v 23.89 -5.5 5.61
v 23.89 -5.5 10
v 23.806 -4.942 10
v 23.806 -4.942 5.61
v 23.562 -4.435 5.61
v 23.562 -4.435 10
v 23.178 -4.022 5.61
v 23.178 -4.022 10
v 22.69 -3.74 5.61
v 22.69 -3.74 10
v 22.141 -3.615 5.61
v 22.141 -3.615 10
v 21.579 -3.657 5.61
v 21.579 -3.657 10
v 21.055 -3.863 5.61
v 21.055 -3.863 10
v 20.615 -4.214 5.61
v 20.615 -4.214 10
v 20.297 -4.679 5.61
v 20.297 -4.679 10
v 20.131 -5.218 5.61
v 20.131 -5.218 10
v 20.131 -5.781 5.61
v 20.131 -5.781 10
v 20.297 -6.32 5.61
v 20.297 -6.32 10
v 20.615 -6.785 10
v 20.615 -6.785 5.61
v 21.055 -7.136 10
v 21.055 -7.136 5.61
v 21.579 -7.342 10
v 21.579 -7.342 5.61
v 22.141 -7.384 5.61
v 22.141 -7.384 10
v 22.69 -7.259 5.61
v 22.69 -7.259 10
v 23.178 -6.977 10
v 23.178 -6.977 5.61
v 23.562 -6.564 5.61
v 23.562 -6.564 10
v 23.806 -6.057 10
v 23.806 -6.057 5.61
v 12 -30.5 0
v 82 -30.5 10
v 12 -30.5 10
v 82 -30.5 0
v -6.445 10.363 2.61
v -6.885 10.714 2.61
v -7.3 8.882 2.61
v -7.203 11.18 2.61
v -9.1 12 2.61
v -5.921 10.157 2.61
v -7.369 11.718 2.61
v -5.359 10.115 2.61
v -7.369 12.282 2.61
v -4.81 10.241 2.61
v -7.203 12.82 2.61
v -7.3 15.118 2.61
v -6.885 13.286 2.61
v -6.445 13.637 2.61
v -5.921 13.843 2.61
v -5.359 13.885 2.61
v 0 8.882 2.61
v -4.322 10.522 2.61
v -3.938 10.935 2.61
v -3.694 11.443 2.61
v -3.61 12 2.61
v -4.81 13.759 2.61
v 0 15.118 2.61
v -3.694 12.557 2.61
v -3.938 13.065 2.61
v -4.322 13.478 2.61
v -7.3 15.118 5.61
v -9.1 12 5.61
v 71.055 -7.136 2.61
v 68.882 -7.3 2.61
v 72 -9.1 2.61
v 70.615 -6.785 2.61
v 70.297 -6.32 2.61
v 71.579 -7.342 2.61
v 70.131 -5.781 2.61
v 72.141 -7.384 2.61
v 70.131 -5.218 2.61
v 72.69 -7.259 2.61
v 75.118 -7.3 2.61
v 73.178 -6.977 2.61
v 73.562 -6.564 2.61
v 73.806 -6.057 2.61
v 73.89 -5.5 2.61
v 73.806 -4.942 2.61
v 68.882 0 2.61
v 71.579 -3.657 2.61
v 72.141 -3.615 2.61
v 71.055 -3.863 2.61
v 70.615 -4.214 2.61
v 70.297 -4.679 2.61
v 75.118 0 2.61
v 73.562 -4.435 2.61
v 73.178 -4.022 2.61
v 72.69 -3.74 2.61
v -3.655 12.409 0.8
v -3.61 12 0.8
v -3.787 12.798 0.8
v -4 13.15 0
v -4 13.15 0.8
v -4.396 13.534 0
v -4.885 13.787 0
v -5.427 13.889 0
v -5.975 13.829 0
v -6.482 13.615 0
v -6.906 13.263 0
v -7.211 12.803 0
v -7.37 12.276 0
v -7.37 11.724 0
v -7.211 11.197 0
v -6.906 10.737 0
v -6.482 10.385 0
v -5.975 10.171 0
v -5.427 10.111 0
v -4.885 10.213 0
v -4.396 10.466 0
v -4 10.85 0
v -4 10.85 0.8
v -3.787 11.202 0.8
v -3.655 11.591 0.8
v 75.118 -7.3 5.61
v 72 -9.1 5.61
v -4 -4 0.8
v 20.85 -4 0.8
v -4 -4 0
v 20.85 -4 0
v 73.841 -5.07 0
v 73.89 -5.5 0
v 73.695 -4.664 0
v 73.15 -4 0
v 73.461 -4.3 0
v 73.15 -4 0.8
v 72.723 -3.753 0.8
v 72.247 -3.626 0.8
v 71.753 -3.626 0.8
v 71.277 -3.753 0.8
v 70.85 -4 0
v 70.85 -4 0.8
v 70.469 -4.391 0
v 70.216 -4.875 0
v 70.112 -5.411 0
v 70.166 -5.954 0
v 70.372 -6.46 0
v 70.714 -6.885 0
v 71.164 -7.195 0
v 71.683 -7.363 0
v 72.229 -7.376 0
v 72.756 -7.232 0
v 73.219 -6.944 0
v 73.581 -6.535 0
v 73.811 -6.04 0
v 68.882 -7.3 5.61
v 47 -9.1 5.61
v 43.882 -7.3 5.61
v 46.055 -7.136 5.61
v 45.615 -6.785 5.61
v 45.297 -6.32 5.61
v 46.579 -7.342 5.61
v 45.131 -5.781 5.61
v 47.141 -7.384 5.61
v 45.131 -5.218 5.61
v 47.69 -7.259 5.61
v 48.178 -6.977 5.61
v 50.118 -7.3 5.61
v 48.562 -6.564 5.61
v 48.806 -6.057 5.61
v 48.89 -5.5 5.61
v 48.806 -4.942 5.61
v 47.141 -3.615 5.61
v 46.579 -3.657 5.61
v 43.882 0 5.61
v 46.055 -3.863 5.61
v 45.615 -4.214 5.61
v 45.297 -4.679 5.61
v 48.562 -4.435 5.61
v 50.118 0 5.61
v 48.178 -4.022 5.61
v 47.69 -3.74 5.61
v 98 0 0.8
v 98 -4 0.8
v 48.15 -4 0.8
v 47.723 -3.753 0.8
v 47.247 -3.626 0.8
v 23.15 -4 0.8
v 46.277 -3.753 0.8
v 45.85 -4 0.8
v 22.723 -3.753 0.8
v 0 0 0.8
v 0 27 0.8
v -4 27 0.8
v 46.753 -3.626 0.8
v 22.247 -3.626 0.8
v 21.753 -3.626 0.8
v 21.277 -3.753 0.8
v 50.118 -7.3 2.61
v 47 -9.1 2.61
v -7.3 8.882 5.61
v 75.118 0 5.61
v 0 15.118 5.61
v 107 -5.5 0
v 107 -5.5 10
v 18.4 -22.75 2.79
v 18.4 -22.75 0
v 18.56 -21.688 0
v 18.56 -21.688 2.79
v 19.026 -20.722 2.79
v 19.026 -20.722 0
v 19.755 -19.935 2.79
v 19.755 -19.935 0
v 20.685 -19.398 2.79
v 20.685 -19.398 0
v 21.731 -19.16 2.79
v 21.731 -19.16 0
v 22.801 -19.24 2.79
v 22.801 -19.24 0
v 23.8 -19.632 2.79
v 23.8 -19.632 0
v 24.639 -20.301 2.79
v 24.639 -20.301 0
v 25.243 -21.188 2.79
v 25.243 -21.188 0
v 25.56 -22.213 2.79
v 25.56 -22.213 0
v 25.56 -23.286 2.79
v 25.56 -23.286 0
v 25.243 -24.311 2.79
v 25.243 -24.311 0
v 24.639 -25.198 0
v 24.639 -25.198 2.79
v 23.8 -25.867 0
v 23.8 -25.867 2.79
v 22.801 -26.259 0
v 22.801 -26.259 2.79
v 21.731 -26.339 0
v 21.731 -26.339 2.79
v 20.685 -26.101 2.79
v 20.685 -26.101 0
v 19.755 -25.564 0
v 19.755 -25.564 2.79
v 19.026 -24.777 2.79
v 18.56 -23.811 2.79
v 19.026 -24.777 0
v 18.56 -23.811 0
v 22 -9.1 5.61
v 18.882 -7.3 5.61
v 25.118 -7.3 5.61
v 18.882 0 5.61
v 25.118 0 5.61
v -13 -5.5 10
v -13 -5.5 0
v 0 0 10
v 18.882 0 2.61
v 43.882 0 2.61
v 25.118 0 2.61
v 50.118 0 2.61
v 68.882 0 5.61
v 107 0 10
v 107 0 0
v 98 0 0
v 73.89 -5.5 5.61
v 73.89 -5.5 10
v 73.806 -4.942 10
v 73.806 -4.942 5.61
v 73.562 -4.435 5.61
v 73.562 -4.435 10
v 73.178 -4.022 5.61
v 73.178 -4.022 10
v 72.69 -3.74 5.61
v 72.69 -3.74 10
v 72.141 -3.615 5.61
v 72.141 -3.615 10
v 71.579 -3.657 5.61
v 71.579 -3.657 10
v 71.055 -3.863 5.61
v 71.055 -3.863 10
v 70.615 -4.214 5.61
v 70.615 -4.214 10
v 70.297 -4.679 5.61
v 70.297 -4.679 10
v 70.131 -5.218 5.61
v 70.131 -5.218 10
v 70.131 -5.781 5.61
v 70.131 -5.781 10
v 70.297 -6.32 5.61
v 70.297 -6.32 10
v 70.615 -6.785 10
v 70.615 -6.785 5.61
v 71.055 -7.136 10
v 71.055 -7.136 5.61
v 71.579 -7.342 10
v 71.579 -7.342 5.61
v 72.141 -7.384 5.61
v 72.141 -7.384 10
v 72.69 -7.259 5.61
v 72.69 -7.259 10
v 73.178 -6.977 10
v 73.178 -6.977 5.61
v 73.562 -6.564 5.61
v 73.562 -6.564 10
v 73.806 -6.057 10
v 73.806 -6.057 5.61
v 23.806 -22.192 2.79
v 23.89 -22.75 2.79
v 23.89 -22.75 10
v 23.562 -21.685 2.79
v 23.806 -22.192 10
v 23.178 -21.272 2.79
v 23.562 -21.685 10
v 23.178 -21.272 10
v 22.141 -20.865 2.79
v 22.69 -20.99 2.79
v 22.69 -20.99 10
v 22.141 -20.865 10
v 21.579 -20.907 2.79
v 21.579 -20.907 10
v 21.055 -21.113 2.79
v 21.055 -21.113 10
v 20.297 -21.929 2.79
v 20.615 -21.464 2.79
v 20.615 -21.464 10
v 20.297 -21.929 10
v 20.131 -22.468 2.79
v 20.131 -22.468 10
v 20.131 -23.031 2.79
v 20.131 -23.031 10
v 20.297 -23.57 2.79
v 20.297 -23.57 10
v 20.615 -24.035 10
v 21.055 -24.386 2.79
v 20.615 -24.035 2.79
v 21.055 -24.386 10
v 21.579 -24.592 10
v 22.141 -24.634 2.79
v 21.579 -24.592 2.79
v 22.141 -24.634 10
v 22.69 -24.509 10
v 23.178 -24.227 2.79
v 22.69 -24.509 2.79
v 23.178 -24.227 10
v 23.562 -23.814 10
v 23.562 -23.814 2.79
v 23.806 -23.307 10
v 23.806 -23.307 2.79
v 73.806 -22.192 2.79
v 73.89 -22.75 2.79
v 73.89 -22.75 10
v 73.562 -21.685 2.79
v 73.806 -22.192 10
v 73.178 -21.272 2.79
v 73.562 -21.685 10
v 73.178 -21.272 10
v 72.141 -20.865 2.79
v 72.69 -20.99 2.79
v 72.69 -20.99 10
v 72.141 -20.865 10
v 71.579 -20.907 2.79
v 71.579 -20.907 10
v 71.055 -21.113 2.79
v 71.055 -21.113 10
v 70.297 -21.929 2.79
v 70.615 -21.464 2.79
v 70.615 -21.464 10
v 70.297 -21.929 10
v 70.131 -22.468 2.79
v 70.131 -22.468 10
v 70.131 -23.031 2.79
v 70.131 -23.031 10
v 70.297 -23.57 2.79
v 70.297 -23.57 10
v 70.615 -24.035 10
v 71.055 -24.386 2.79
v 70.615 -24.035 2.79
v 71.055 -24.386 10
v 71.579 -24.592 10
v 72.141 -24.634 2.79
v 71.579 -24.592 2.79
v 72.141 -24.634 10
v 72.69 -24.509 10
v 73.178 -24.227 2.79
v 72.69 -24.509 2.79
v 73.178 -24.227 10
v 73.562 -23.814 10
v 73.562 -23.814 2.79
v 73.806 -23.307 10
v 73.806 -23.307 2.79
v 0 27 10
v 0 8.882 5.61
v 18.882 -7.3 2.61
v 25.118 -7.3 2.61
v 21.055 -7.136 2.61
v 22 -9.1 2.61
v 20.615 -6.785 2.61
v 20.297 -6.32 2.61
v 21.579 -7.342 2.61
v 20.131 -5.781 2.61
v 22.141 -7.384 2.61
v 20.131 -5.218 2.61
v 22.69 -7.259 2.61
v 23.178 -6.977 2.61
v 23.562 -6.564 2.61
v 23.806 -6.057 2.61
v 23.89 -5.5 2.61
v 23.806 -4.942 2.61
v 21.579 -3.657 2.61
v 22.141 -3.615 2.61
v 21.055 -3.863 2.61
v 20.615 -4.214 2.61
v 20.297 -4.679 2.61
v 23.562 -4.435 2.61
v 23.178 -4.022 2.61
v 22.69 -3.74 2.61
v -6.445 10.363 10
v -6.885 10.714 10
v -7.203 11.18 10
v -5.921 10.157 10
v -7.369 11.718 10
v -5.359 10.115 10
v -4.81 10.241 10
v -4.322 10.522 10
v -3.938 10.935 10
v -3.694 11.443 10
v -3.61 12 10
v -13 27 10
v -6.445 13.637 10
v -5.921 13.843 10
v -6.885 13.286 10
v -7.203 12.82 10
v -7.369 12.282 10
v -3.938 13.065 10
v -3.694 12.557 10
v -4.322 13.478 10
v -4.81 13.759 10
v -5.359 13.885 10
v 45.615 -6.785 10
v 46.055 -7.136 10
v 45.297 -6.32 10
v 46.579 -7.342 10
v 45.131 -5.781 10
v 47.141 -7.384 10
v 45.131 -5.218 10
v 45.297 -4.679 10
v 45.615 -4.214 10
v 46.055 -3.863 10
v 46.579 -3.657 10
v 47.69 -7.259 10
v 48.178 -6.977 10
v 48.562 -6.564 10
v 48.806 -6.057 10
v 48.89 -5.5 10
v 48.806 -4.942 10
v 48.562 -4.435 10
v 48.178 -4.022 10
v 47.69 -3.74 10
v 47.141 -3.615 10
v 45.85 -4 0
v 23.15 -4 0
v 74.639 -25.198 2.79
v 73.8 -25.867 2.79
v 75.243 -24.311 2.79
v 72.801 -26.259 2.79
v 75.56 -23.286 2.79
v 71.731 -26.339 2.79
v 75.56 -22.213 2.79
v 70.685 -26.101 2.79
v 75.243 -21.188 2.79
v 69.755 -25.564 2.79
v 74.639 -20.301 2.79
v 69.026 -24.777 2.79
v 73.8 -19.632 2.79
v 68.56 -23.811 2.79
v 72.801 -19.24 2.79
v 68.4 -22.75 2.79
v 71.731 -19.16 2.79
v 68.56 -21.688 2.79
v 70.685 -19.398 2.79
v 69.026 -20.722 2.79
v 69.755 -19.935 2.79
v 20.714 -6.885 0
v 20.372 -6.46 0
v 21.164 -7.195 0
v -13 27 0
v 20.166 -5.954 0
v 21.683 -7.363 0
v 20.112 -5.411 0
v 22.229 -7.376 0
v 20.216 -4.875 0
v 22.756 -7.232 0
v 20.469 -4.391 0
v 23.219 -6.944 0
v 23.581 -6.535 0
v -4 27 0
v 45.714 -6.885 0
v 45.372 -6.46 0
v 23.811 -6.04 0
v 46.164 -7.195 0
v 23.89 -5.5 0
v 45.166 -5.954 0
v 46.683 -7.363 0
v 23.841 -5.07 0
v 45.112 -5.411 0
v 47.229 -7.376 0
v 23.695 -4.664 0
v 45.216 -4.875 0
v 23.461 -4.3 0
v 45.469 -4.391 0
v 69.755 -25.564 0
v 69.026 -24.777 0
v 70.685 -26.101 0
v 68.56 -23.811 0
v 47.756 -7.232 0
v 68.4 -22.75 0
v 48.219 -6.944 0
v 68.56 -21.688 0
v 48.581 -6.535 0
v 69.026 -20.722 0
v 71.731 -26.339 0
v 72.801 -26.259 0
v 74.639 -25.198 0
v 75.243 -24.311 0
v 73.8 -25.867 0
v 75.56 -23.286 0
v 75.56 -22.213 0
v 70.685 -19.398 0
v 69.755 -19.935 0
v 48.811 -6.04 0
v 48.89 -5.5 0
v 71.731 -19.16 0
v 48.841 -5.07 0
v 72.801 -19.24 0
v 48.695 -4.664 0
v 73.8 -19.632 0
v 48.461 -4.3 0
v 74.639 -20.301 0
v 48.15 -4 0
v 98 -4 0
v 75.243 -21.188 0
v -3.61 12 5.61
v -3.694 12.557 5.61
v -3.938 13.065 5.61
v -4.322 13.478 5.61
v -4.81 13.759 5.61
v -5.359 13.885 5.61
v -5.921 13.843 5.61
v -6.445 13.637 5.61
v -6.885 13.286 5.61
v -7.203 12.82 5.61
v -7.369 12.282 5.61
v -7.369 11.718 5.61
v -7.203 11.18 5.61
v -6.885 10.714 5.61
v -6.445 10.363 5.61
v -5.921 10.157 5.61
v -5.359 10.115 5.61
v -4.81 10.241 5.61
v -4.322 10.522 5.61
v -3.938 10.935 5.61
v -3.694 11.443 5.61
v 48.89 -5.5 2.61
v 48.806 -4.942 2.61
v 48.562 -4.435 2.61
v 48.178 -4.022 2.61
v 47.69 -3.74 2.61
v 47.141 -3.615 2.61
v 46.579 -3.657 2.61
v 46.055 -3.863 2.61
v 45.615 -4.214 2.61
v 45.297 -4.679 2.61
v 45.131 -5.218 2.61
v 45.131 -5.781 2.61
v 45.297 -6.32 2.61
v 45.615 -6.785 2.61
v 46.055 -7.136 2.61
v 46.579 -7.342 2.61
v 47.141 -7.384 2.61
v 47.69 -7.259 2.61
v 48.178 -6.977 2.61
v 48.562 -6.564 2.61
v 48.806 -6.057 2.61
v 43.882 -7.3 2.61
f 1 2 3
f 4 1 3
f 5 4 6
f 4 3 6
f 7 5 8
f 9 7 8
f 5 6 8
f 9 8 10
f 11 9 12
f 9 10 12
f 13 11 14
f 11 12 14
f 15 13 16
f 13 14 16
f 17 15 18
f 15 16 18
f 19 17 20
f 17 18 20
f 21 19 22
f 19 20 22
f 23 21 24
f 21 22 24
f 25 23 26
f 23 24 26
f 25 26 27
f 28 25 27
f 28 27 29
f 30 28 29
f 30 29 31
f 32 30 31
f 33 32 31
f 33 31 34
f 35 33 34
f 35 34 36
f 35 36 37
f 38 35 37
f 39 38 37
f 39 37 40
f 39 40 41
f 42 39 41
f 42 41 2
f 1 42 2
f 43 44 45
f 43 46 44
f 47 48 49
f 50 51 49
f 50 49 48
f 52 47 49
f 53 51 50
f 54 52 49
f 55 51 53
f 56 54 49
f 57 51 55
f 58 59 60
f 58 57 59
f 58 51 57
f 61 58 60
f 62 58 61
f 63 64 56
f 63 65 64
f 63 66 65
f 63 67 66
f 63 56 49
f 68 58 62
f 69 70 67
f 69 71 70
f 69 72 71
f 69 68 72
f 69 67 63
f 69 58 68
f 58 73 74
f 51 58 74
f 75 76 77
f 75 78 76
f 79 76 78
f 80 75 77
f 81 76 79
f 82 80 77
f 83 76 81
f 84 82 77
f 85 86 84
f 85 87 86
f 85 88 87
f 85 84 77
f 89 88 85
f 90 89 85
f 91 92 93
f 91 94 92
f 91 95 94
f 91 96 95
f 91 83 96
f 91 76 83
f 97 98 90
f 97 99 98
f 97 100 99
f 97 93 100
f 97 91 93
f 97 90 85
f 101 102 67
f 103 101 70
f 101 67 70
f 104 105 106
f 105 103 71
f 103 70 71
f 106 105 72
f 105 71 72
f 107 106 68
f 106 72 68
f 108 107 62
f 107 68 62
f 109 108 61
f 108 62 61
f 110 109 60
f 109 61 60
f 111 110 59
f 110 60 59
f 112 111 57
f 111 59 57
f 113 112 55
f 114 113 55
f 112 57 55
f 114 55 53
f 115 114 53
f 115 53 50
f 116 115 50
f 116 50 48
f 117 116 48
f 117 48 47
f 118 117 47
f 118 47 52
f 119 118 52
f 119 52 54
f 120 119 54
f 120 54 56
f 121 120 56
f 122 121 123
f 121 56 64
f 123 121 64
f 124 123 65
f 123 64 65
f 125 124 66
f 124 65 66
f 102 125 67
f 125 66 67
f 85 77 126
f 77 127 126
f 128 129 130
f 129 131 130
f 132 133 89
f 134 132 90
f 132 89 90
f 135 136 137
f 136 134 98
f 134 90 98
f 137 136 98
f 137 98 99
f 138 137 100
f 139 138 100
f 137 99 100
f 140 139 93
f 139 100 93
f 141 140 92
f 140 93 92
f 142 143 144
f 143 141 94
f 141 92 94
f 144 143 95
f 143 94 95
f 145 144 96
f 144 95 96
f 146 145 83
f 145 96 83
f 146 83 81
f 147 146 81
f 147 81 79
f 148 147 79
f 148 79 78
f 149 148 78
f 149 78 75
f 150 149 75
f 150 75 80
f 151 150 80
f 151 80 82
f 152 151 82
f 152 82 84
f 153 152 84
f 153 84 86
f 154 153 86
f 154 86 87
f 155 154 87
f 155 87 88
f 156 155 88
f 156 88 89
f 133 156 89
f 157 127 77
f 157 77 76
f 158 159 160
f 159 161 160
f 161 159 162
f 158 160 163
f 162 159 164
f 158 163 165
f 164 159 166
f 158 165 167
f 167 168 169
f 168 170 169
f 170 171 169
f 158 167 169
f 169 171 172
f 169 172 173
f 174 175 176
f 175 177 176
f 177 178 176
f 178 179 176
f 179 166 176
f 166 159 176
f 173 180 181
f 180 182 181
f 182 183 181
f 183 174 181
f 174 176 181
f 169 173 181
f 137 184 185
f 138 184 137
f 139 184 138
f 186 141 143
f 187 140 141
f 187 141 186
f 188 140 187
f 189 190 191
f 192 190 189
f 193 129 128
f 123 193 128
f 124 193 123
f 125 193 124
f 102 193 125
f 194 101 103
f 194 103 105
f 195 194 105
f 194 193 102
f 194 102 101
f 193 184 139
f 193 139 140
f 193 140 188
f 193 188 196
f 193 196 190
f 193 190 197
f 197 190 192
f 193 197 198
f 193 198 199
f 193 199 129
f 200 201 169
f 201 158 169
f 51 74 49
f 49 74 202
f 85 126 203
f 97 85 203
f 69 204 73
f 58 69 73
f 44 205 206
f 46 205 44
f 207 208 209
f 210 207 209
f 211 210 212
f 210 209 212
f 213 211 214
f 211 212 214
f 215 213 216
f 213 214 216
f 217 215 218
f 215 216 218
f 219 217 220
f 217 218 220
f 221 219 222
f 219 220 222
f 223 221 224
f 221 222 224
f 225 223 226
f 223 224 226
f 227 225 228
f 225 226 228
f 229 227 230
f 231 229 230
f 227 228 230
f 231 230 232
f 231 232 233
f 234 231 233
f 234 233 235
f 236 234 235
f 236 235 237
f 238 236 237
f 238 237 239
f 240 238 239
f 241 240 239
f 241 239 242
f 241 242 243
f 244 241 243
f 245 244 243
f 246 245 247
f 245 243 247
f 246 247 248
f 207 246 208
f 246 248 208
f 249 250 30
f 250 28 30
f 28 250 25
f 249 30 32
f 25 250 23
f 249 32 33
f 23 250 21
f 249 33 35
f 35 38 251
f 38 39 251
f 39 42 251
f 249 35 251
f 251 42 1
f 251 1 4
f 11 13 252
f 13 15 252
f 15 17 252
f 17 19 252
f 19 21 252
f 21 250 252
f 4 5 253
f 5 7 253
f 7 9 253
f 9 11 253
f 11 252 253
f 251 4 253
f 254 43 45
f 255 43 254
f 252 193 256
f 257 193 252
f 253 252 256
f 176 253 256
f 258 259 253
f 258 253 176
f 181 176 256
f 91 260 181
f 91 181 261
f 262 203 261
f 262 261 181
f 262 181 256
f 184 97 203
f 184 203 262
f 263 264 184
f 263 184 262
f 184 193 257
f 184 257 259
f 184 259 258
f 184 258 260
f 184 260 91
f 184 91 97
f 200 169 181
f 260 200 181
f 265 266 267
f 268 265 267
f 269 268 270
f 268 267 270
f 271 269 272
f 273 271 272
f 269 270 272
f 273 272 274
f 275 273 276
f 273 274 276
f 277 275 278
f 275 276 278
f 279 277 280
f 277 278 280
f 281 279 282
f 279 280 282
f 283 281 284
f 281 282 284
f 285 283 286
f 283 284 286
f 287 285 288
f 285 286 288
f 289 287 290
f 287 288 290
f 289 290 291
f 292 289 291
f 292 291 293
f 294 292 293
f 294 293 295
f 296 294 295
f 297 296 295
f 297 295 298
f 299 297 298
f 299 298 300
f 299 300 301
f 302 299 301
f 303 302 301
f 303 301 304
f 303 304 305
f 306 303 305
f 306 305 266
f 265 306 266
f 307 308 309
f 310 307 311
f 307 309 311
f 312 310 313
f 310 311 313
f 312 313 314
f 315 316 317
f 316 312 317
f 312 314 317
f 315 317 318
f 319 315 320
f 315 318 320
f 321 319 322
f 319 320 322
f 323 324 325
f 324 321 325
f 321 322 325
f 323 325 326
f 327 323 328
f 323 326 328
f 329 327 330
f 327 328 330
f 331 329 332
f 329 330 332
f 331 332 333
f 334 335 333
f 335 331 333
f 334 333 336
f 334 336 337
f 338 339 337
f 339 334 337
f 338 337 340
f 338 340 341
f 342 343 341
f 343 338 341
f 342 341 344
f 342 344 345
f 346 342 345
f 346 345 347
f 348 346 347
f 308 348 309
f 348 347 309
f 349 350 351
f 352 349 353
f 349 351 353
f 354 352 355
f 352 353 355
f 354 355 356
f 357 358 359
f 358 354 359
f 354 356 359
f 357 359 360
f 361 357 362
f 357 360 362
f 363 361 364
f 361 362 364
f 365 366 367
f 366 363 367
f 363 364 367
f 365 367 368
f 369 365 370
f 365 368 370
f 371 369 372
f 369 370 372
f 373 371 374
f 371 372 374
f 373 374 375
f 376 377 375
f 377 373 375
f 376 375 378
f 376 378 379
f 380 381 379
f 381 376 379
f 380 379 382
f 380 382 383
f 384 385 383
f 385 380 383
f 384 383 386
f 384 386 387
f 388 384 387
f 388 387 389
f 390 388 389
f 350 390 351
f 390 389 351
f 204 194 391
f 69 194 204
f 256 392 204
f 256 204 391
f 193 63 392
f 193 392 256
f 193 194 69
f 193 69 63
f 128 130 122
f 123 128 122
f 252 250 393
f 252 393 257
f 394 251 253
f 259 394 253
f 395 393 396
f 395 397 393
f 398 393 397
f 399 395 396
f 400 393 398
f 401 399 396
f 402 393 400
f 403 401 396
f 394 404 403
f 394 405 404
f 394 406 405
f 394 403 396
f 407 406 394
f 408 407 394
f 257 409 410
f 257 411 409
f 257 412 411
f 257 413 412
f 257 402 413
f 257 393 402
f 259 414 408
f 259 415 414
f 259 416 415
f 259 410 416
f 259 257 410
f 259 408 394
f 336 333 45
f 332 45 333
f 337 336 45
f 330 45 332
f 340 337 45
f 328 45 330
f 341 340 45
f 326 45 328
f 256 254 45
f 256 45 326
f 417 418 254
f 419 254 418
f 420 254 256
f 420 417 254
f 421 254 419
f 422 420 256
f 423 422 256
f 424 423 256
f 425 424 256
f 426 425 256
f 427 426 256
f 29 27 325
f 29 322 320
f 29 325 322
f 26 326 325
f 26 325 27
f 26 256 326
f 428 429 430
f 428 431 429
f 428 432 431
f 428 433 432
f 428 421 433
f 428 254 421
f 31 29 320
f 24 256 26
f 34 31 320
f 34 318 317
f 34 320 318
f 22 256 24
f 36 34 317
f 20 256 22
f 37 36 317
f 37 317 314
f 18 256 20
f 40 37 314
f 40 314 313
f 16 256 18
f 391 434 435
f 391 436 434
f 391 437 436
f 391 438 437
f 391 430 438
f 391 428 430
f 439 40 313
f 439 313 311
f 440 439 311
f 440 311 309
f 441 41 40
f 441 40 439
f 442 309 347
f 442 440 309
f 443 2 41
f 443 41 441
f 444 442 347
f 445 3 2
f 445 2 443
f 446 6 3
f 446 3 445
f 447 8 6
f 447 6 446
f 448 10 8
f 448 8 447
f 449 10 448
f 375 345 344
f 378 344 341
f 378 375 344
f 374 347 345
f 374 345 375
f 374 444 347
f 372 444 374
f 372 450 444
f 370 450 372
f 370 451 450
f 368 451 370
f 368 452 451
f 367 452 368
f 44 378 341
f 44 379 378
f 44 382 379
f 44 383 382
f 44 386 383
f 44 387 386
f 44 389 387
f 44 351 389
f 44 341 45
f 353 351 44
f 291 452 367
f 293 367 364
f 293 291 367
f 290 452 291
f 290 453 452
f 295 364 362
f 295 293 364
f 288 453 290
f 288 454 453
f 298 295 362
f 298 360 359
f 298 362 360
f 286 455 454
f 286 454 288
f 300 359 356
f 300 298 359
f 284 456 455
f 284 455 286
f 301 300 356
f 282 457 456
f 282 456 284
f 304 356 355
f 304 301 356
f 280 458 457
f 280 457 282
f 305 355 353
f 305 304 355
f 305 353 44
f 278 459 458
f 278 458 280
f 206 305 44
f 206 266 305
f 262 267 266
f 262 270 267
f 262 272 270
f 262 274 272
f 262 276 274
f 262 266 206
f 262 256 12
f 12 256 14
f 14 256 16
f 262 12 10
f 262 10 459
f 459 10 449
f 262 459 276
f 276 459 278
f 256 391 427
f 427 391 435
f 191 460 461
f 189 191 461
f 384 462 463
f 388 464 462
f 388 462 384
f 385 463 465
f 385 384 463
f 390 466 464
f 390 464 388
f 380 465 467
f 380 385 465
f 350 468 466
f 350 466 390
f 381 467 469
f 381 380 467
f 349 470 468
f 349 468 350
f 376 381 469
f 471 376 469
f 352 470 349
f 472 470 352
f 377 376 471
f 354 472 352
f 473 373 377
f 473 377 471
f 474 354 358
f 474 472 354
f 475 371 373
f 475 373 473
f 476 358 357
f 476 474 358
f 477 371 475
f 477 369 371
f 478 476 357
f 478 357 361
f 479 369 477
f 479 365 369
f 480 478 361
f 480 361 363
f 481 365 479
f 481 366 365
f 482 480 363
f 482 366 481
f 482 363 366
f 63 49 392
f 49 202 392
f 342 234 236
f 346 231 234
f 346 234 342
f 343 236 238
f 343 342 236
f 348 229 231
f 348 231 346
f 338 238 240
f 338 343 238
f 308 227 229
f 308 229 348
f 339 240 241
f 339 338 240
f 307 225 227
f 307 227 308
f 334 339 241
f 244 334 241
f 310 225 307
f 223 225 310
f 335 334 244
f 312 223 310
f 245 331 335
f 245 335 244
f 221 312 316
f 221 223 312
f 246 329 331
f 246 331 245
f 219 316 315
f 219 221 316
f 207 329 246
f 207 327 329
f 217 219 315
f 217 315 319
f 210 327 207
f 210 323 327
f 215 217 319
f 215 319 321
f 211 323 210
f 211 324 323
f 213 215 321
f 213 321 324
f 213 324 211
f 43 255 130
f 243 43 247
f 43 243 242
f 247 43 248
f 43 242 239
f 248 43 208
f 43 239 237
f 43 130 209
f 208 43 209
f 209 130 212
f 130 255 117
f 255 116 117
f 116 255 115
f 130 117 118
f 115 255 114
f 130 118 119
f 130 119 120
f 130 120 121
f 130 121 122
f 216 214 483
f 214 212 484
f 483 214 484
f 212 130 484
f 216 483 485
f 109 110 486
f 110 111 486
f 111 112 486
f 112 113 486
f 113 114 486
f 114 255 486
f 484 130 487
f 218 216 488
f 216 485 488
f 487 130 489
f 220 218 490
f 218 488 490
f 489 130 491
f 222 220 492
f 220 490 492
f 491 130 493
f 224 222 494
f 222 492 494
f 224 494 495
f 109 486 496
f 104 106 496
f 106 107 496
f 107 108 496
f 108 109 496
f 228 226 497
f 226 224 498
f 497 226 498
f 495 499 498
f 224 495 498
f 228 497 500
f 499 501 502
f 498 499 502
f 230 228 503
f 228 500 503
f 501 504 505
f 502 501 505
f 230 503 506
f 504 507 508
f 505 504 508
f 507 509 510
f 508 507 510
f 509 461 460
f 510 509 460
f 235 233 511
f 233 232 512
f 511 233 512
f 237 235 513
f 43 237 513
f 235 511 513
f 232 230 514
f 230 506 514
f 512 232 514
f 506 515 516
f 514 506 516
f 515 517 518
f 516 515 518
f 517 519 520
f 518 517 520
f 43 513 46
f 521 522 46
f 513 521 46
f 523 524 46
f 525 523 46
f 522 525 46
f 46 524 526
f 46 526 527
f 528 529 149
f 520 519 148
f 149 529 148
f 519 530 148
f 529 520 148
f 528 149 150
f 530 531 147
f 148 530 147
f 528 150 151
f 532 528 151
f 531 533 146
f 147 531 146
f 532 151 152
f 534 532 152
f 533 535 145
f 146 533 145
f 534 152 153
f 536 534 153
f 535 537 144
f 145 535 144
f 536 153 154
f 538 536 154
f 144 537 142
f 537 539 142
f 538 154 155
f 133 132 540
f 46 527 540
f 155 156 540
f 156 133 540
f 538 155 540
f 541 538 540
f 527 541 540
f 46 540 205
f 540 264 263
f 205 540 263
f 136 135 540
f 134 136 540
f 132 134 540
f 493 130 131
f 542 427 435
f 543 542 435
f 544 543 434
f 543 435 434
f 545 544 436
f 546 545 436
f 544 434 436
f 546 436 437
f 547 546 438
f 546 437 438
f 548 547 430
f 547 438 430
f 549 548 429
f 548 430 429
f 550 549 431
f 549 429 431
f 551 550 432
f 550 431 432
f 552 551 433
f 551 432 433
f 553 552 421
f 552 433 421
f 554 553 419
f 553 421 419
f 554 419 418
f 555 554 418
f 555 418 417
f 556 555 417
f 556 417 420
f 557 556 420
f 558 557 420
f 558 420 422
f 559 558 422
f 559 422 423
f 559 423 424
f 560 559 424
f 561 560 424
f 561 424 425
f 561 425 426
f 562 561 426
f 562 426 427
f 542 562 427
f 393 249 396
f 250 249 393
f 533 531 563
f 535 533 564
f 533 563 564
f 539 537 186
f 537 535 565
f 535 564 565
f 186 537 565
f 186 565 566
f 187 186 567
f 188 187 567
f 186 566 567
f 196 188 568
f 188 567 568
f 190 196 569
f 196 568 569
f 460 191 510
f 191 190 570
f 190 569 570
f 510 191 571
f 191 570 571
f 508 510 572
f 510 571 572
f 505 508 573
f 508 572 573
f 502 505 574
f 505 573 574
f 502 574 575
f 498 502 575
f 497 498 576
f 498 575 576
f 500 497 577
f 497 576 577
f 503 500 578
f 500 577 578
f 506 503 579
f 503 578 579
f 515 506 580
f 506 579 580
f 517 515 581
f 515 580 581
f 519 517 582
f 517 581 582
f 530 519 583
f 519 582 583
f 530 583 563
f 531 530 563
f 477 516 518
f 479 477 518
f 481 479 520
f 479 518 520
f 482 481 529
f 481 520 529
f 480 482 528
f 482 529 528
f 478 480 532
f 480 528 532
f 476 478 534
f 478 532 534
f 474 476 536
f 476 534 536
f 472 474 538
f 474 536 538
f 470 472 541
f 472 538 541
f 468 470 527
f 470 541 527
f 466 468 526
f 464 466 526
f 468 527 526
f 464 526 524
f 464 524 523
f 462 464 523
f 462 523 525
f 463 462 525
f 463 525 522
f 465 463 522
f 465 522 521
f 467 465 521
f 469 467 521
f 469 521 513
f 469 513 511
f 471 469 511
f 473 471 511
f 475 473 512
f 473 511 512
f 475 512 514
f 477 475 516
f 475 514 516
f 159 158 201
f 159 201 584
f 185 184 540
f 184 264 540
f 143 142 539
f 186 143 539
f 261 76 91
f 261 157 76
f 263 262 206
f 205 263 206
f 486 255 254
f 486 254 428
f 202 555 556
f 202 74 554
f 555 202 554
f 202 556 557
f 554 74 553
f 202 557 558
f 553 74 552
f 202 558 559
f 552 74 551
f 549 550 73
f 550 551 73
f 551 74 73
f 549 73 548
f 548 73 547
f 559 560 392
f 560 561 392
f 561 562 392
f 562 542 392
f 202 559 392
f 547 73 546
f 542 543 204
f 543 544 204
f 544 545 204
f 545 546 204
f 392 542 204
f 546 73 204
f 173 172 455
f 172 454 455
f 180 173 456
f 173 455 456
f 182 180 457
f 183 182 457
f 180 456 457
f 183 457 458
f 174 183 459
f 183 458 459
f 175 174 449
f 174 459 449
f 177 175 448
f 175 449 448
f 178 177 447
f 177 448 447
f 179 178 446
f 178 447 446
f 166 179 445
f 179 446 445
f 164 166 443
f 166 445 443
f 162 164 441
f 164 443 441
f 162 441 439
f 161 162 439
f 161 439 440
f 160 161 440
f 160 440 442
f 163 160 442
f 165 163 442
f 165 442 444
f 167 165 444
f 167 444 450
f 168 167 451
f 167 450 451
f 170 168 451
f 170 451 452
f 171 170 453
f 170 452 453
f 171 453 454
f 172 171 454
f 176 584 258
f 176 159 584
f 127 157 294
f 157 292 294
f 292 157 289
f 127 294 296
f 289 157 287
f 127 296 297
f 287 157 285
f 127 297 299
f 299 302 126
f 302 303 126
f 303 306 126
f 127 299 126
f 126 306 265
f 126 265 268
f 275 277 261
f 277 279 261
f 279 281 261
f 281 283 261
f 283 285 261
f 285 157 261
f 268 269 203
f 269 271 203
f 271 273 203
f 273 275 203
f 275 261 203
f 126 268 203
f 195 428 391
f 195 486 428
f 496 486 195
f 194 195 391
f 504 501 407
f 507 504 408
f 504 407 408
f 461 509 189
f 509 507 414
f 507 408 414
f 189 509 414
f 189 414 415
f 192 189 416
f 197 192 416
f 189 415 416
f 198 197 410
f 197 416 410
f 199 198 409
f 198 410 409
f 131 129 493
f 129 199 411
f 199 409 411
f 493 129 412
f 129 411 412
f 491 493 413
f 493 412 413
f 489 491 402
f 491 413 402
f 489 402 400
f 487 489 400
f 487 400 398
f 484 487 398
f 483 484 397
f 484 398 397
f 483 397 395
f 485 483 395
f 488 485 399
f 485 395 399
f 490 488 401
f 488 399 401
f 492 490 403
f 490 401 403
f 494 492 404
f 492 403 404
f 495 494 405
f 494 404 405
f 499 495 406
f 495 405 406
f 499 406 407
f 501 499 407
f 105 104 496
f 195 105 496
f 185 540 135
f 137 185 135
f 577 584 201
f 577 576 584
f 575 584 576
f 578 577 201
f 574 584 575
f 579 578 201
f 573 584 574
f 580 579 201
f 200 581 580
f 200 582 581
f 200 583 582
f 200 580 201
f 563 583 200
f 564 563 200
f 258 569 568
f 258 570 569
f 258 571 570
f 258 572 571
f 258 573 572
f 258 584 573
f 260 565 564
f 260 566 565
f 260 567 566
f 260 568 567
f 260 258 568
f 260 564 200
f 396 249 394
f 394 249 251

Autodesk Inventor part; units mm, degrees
sketch "Boceto1" plane through (0, 0, 0) normal (0, 0, 1) x (1, 0, 0)
  line L0 (0, 0) -> (107, 0)
  line L1 (107, 0) -> (107, -5.5)
  line L2 (107, -5.5) -> (82, -30.4995)
  line L3 (82, -30.4995) -> (12, -30.4995)
  line L4 (12, -30.4995) -> (-13, -5.5)
  line L5 (-13, -5.5) -> (-13, 27)
  line L6 (-13, 27) -> (0, 27)
  line L7 (0, 27) -> (0, 0)
  dimension "d0" = 107
  dimension "d1" = 5.5
  dimension "d2" = 35.355
  dimension "d3" = 70
  dimension "d4" = 35.355
  dimension "d5" = 32.5
  dimension "d6" = 13
  dimension "d7" = 27
extrude "Extrusión1" add sketch "Boceto1" along normal blind 10
sketch "Boceto2" plane through (0, 0, 10) normal (0, 0, 1) x (1, 0, 0)
  circle A0 centre (22, -5.4995) radius 1.89
  circle A1 centre (47, -5.4995) radius 1.89
  circle A2 centre (72, -5.4995) radius 1.89
  circle A3 centre (-5.5, 12) radius 1.89
  circle A4 centre (22, -22.7495) radius 1.89
  circle A5 centre (72, -22.7495) radius 1.89
  line L0 (12, -30.4995) -> (82, -30.4995) projected
  line L1 (-13, 27) -> (-13, -5.5) projected
  line L2 (0, 27) -> (-13, 27) projected
  line L3 (0, 27) -> (0, 0) projected
  dimension "d10" = 3.78
  dimension "d11" = 3.78
  dimension "d12" = 3.78
  dimension "d13" = 3.78
  dimension "d14" = 3.78
  dimension "d15" = 3.78
  dimension "d16" = 25
  dimension "d17" = 25
  dimension "d18" = 17.25
  dimension "d19" = 7.75
  dimension "d20" = 35
  dimension "d21" = 15
  dimension "d22" = 5.5
extrude "Extrusión2" cut sketch "Boceto2" against normal through all
sketch "Boceto3" plane through (0, 0, 0) normal (0, 0, -1) x (-1, 0, 0)
  circle A0 centre (-72, -22.7495) radius 1.89 projected
  circle A1 centre (-22, -22.7495) radius 1.89 projected
  circle A2 centre (-72, -22.7495) radius 3.6
  circle A3 centre (-22, -22.7495) radius 3.6
  point P0 (0, 0)
  dimension "d25" = 7.2
  dimension "d26" = 7.2
extrude "Extrusión3" cut sketch "Boceto3" against normal blind 2.79
ref_plane "Plano de trabajo1" through (0, 0, 5.61) normal (0, 0, 1) x (1, 0, 0)
sketch "Boceto4" plane through (0, 0, 5.61) normal (0, 0, 1) x (1, 0, 0)
  circle A0 centre (-5.5, 12) radius 1.89 projected
  circle A1 centre (22, -5.4995) radius 1.89 projected
  circle A2 centre (47, -5.4995) radius 1.89 projected
  circle A3 centre (72, -5.4995) radius 1.89 projected
  line L0 (0, 27) -> (0, 0) projected
  line L1 (0, 15.1175) -> (-7.3, 15.1175)
  line L2 (-7.3, 15.1175) -> (-9.1003, 12)
  line L3 (-9.1003, 12) -> (-7.3, 8.8825)
  line L4 (-7.3, 8.8825) -> (0, 8.8825)
  line L5 (0, 15.1175) -> (0, 8.8825)
  line L6 (22, -9.1003) -> (18.8825, -7.3)
  line L7 (18.8825, -7.3) -> (18.8825, 0)
  line L8 (0, 0) -> (107, 0) projected
  line L9 (22, -9.1003) -> (25.1175, -7.3)
  line L10 (25.1175, -7.3) -> (25.1175, 0)
  line L11 (25.1175, 0) -> (18.8825, 0)
  point P0 (0, 12)
  point P1 (22, 0)
  dimension "d30" = 7.3
  dimension "d31" = 6.235
  dimension "d32" = 3.6
  dimension "d33" = 6.235
  dimension "d34" = 3.6
  dimension "d35" = 7.3
extrude "Extrusión4" cut sketch "Boceto4" against normal blind 3 contours L8 L10 L9 L6 L7 | L0 L4 L3 L2 L1
pattern_linear "Patrón rectangular1" count 3 spacing -25 along (-1, 0, 0) of "Extrusión4"
sketch "Boceto5" plane through (0, 0, 0) normal (0, 0, -1) x (-1, 0, 0)
  line L0 (-98, 0) -> (-98, -4)
  line L1 (-98, -4) -> (4, -4)
  line L2 (4, -4) -> (4, 27)
  line L3 (13, 27) -> (0, 27) projected
  line L4 (0, 27) -> (4, 27)
  line L5 (0, 27) -> (0, 0)
  line L6 (0, 0) -> (0, 27) projected
  line L7 (0, 0) -> (-98, 0)
  line L8 (-107, 0) -> (-107, -5.5) projected
  line L9 (13, -5.5) -> (13, 27) projected
  dimension "d41" = 4
  dimension "d42" = 9
  dimension "d43" = 9
extrude "Extrusión5" cut sketch "Boceto5" against normal blind 0.8
